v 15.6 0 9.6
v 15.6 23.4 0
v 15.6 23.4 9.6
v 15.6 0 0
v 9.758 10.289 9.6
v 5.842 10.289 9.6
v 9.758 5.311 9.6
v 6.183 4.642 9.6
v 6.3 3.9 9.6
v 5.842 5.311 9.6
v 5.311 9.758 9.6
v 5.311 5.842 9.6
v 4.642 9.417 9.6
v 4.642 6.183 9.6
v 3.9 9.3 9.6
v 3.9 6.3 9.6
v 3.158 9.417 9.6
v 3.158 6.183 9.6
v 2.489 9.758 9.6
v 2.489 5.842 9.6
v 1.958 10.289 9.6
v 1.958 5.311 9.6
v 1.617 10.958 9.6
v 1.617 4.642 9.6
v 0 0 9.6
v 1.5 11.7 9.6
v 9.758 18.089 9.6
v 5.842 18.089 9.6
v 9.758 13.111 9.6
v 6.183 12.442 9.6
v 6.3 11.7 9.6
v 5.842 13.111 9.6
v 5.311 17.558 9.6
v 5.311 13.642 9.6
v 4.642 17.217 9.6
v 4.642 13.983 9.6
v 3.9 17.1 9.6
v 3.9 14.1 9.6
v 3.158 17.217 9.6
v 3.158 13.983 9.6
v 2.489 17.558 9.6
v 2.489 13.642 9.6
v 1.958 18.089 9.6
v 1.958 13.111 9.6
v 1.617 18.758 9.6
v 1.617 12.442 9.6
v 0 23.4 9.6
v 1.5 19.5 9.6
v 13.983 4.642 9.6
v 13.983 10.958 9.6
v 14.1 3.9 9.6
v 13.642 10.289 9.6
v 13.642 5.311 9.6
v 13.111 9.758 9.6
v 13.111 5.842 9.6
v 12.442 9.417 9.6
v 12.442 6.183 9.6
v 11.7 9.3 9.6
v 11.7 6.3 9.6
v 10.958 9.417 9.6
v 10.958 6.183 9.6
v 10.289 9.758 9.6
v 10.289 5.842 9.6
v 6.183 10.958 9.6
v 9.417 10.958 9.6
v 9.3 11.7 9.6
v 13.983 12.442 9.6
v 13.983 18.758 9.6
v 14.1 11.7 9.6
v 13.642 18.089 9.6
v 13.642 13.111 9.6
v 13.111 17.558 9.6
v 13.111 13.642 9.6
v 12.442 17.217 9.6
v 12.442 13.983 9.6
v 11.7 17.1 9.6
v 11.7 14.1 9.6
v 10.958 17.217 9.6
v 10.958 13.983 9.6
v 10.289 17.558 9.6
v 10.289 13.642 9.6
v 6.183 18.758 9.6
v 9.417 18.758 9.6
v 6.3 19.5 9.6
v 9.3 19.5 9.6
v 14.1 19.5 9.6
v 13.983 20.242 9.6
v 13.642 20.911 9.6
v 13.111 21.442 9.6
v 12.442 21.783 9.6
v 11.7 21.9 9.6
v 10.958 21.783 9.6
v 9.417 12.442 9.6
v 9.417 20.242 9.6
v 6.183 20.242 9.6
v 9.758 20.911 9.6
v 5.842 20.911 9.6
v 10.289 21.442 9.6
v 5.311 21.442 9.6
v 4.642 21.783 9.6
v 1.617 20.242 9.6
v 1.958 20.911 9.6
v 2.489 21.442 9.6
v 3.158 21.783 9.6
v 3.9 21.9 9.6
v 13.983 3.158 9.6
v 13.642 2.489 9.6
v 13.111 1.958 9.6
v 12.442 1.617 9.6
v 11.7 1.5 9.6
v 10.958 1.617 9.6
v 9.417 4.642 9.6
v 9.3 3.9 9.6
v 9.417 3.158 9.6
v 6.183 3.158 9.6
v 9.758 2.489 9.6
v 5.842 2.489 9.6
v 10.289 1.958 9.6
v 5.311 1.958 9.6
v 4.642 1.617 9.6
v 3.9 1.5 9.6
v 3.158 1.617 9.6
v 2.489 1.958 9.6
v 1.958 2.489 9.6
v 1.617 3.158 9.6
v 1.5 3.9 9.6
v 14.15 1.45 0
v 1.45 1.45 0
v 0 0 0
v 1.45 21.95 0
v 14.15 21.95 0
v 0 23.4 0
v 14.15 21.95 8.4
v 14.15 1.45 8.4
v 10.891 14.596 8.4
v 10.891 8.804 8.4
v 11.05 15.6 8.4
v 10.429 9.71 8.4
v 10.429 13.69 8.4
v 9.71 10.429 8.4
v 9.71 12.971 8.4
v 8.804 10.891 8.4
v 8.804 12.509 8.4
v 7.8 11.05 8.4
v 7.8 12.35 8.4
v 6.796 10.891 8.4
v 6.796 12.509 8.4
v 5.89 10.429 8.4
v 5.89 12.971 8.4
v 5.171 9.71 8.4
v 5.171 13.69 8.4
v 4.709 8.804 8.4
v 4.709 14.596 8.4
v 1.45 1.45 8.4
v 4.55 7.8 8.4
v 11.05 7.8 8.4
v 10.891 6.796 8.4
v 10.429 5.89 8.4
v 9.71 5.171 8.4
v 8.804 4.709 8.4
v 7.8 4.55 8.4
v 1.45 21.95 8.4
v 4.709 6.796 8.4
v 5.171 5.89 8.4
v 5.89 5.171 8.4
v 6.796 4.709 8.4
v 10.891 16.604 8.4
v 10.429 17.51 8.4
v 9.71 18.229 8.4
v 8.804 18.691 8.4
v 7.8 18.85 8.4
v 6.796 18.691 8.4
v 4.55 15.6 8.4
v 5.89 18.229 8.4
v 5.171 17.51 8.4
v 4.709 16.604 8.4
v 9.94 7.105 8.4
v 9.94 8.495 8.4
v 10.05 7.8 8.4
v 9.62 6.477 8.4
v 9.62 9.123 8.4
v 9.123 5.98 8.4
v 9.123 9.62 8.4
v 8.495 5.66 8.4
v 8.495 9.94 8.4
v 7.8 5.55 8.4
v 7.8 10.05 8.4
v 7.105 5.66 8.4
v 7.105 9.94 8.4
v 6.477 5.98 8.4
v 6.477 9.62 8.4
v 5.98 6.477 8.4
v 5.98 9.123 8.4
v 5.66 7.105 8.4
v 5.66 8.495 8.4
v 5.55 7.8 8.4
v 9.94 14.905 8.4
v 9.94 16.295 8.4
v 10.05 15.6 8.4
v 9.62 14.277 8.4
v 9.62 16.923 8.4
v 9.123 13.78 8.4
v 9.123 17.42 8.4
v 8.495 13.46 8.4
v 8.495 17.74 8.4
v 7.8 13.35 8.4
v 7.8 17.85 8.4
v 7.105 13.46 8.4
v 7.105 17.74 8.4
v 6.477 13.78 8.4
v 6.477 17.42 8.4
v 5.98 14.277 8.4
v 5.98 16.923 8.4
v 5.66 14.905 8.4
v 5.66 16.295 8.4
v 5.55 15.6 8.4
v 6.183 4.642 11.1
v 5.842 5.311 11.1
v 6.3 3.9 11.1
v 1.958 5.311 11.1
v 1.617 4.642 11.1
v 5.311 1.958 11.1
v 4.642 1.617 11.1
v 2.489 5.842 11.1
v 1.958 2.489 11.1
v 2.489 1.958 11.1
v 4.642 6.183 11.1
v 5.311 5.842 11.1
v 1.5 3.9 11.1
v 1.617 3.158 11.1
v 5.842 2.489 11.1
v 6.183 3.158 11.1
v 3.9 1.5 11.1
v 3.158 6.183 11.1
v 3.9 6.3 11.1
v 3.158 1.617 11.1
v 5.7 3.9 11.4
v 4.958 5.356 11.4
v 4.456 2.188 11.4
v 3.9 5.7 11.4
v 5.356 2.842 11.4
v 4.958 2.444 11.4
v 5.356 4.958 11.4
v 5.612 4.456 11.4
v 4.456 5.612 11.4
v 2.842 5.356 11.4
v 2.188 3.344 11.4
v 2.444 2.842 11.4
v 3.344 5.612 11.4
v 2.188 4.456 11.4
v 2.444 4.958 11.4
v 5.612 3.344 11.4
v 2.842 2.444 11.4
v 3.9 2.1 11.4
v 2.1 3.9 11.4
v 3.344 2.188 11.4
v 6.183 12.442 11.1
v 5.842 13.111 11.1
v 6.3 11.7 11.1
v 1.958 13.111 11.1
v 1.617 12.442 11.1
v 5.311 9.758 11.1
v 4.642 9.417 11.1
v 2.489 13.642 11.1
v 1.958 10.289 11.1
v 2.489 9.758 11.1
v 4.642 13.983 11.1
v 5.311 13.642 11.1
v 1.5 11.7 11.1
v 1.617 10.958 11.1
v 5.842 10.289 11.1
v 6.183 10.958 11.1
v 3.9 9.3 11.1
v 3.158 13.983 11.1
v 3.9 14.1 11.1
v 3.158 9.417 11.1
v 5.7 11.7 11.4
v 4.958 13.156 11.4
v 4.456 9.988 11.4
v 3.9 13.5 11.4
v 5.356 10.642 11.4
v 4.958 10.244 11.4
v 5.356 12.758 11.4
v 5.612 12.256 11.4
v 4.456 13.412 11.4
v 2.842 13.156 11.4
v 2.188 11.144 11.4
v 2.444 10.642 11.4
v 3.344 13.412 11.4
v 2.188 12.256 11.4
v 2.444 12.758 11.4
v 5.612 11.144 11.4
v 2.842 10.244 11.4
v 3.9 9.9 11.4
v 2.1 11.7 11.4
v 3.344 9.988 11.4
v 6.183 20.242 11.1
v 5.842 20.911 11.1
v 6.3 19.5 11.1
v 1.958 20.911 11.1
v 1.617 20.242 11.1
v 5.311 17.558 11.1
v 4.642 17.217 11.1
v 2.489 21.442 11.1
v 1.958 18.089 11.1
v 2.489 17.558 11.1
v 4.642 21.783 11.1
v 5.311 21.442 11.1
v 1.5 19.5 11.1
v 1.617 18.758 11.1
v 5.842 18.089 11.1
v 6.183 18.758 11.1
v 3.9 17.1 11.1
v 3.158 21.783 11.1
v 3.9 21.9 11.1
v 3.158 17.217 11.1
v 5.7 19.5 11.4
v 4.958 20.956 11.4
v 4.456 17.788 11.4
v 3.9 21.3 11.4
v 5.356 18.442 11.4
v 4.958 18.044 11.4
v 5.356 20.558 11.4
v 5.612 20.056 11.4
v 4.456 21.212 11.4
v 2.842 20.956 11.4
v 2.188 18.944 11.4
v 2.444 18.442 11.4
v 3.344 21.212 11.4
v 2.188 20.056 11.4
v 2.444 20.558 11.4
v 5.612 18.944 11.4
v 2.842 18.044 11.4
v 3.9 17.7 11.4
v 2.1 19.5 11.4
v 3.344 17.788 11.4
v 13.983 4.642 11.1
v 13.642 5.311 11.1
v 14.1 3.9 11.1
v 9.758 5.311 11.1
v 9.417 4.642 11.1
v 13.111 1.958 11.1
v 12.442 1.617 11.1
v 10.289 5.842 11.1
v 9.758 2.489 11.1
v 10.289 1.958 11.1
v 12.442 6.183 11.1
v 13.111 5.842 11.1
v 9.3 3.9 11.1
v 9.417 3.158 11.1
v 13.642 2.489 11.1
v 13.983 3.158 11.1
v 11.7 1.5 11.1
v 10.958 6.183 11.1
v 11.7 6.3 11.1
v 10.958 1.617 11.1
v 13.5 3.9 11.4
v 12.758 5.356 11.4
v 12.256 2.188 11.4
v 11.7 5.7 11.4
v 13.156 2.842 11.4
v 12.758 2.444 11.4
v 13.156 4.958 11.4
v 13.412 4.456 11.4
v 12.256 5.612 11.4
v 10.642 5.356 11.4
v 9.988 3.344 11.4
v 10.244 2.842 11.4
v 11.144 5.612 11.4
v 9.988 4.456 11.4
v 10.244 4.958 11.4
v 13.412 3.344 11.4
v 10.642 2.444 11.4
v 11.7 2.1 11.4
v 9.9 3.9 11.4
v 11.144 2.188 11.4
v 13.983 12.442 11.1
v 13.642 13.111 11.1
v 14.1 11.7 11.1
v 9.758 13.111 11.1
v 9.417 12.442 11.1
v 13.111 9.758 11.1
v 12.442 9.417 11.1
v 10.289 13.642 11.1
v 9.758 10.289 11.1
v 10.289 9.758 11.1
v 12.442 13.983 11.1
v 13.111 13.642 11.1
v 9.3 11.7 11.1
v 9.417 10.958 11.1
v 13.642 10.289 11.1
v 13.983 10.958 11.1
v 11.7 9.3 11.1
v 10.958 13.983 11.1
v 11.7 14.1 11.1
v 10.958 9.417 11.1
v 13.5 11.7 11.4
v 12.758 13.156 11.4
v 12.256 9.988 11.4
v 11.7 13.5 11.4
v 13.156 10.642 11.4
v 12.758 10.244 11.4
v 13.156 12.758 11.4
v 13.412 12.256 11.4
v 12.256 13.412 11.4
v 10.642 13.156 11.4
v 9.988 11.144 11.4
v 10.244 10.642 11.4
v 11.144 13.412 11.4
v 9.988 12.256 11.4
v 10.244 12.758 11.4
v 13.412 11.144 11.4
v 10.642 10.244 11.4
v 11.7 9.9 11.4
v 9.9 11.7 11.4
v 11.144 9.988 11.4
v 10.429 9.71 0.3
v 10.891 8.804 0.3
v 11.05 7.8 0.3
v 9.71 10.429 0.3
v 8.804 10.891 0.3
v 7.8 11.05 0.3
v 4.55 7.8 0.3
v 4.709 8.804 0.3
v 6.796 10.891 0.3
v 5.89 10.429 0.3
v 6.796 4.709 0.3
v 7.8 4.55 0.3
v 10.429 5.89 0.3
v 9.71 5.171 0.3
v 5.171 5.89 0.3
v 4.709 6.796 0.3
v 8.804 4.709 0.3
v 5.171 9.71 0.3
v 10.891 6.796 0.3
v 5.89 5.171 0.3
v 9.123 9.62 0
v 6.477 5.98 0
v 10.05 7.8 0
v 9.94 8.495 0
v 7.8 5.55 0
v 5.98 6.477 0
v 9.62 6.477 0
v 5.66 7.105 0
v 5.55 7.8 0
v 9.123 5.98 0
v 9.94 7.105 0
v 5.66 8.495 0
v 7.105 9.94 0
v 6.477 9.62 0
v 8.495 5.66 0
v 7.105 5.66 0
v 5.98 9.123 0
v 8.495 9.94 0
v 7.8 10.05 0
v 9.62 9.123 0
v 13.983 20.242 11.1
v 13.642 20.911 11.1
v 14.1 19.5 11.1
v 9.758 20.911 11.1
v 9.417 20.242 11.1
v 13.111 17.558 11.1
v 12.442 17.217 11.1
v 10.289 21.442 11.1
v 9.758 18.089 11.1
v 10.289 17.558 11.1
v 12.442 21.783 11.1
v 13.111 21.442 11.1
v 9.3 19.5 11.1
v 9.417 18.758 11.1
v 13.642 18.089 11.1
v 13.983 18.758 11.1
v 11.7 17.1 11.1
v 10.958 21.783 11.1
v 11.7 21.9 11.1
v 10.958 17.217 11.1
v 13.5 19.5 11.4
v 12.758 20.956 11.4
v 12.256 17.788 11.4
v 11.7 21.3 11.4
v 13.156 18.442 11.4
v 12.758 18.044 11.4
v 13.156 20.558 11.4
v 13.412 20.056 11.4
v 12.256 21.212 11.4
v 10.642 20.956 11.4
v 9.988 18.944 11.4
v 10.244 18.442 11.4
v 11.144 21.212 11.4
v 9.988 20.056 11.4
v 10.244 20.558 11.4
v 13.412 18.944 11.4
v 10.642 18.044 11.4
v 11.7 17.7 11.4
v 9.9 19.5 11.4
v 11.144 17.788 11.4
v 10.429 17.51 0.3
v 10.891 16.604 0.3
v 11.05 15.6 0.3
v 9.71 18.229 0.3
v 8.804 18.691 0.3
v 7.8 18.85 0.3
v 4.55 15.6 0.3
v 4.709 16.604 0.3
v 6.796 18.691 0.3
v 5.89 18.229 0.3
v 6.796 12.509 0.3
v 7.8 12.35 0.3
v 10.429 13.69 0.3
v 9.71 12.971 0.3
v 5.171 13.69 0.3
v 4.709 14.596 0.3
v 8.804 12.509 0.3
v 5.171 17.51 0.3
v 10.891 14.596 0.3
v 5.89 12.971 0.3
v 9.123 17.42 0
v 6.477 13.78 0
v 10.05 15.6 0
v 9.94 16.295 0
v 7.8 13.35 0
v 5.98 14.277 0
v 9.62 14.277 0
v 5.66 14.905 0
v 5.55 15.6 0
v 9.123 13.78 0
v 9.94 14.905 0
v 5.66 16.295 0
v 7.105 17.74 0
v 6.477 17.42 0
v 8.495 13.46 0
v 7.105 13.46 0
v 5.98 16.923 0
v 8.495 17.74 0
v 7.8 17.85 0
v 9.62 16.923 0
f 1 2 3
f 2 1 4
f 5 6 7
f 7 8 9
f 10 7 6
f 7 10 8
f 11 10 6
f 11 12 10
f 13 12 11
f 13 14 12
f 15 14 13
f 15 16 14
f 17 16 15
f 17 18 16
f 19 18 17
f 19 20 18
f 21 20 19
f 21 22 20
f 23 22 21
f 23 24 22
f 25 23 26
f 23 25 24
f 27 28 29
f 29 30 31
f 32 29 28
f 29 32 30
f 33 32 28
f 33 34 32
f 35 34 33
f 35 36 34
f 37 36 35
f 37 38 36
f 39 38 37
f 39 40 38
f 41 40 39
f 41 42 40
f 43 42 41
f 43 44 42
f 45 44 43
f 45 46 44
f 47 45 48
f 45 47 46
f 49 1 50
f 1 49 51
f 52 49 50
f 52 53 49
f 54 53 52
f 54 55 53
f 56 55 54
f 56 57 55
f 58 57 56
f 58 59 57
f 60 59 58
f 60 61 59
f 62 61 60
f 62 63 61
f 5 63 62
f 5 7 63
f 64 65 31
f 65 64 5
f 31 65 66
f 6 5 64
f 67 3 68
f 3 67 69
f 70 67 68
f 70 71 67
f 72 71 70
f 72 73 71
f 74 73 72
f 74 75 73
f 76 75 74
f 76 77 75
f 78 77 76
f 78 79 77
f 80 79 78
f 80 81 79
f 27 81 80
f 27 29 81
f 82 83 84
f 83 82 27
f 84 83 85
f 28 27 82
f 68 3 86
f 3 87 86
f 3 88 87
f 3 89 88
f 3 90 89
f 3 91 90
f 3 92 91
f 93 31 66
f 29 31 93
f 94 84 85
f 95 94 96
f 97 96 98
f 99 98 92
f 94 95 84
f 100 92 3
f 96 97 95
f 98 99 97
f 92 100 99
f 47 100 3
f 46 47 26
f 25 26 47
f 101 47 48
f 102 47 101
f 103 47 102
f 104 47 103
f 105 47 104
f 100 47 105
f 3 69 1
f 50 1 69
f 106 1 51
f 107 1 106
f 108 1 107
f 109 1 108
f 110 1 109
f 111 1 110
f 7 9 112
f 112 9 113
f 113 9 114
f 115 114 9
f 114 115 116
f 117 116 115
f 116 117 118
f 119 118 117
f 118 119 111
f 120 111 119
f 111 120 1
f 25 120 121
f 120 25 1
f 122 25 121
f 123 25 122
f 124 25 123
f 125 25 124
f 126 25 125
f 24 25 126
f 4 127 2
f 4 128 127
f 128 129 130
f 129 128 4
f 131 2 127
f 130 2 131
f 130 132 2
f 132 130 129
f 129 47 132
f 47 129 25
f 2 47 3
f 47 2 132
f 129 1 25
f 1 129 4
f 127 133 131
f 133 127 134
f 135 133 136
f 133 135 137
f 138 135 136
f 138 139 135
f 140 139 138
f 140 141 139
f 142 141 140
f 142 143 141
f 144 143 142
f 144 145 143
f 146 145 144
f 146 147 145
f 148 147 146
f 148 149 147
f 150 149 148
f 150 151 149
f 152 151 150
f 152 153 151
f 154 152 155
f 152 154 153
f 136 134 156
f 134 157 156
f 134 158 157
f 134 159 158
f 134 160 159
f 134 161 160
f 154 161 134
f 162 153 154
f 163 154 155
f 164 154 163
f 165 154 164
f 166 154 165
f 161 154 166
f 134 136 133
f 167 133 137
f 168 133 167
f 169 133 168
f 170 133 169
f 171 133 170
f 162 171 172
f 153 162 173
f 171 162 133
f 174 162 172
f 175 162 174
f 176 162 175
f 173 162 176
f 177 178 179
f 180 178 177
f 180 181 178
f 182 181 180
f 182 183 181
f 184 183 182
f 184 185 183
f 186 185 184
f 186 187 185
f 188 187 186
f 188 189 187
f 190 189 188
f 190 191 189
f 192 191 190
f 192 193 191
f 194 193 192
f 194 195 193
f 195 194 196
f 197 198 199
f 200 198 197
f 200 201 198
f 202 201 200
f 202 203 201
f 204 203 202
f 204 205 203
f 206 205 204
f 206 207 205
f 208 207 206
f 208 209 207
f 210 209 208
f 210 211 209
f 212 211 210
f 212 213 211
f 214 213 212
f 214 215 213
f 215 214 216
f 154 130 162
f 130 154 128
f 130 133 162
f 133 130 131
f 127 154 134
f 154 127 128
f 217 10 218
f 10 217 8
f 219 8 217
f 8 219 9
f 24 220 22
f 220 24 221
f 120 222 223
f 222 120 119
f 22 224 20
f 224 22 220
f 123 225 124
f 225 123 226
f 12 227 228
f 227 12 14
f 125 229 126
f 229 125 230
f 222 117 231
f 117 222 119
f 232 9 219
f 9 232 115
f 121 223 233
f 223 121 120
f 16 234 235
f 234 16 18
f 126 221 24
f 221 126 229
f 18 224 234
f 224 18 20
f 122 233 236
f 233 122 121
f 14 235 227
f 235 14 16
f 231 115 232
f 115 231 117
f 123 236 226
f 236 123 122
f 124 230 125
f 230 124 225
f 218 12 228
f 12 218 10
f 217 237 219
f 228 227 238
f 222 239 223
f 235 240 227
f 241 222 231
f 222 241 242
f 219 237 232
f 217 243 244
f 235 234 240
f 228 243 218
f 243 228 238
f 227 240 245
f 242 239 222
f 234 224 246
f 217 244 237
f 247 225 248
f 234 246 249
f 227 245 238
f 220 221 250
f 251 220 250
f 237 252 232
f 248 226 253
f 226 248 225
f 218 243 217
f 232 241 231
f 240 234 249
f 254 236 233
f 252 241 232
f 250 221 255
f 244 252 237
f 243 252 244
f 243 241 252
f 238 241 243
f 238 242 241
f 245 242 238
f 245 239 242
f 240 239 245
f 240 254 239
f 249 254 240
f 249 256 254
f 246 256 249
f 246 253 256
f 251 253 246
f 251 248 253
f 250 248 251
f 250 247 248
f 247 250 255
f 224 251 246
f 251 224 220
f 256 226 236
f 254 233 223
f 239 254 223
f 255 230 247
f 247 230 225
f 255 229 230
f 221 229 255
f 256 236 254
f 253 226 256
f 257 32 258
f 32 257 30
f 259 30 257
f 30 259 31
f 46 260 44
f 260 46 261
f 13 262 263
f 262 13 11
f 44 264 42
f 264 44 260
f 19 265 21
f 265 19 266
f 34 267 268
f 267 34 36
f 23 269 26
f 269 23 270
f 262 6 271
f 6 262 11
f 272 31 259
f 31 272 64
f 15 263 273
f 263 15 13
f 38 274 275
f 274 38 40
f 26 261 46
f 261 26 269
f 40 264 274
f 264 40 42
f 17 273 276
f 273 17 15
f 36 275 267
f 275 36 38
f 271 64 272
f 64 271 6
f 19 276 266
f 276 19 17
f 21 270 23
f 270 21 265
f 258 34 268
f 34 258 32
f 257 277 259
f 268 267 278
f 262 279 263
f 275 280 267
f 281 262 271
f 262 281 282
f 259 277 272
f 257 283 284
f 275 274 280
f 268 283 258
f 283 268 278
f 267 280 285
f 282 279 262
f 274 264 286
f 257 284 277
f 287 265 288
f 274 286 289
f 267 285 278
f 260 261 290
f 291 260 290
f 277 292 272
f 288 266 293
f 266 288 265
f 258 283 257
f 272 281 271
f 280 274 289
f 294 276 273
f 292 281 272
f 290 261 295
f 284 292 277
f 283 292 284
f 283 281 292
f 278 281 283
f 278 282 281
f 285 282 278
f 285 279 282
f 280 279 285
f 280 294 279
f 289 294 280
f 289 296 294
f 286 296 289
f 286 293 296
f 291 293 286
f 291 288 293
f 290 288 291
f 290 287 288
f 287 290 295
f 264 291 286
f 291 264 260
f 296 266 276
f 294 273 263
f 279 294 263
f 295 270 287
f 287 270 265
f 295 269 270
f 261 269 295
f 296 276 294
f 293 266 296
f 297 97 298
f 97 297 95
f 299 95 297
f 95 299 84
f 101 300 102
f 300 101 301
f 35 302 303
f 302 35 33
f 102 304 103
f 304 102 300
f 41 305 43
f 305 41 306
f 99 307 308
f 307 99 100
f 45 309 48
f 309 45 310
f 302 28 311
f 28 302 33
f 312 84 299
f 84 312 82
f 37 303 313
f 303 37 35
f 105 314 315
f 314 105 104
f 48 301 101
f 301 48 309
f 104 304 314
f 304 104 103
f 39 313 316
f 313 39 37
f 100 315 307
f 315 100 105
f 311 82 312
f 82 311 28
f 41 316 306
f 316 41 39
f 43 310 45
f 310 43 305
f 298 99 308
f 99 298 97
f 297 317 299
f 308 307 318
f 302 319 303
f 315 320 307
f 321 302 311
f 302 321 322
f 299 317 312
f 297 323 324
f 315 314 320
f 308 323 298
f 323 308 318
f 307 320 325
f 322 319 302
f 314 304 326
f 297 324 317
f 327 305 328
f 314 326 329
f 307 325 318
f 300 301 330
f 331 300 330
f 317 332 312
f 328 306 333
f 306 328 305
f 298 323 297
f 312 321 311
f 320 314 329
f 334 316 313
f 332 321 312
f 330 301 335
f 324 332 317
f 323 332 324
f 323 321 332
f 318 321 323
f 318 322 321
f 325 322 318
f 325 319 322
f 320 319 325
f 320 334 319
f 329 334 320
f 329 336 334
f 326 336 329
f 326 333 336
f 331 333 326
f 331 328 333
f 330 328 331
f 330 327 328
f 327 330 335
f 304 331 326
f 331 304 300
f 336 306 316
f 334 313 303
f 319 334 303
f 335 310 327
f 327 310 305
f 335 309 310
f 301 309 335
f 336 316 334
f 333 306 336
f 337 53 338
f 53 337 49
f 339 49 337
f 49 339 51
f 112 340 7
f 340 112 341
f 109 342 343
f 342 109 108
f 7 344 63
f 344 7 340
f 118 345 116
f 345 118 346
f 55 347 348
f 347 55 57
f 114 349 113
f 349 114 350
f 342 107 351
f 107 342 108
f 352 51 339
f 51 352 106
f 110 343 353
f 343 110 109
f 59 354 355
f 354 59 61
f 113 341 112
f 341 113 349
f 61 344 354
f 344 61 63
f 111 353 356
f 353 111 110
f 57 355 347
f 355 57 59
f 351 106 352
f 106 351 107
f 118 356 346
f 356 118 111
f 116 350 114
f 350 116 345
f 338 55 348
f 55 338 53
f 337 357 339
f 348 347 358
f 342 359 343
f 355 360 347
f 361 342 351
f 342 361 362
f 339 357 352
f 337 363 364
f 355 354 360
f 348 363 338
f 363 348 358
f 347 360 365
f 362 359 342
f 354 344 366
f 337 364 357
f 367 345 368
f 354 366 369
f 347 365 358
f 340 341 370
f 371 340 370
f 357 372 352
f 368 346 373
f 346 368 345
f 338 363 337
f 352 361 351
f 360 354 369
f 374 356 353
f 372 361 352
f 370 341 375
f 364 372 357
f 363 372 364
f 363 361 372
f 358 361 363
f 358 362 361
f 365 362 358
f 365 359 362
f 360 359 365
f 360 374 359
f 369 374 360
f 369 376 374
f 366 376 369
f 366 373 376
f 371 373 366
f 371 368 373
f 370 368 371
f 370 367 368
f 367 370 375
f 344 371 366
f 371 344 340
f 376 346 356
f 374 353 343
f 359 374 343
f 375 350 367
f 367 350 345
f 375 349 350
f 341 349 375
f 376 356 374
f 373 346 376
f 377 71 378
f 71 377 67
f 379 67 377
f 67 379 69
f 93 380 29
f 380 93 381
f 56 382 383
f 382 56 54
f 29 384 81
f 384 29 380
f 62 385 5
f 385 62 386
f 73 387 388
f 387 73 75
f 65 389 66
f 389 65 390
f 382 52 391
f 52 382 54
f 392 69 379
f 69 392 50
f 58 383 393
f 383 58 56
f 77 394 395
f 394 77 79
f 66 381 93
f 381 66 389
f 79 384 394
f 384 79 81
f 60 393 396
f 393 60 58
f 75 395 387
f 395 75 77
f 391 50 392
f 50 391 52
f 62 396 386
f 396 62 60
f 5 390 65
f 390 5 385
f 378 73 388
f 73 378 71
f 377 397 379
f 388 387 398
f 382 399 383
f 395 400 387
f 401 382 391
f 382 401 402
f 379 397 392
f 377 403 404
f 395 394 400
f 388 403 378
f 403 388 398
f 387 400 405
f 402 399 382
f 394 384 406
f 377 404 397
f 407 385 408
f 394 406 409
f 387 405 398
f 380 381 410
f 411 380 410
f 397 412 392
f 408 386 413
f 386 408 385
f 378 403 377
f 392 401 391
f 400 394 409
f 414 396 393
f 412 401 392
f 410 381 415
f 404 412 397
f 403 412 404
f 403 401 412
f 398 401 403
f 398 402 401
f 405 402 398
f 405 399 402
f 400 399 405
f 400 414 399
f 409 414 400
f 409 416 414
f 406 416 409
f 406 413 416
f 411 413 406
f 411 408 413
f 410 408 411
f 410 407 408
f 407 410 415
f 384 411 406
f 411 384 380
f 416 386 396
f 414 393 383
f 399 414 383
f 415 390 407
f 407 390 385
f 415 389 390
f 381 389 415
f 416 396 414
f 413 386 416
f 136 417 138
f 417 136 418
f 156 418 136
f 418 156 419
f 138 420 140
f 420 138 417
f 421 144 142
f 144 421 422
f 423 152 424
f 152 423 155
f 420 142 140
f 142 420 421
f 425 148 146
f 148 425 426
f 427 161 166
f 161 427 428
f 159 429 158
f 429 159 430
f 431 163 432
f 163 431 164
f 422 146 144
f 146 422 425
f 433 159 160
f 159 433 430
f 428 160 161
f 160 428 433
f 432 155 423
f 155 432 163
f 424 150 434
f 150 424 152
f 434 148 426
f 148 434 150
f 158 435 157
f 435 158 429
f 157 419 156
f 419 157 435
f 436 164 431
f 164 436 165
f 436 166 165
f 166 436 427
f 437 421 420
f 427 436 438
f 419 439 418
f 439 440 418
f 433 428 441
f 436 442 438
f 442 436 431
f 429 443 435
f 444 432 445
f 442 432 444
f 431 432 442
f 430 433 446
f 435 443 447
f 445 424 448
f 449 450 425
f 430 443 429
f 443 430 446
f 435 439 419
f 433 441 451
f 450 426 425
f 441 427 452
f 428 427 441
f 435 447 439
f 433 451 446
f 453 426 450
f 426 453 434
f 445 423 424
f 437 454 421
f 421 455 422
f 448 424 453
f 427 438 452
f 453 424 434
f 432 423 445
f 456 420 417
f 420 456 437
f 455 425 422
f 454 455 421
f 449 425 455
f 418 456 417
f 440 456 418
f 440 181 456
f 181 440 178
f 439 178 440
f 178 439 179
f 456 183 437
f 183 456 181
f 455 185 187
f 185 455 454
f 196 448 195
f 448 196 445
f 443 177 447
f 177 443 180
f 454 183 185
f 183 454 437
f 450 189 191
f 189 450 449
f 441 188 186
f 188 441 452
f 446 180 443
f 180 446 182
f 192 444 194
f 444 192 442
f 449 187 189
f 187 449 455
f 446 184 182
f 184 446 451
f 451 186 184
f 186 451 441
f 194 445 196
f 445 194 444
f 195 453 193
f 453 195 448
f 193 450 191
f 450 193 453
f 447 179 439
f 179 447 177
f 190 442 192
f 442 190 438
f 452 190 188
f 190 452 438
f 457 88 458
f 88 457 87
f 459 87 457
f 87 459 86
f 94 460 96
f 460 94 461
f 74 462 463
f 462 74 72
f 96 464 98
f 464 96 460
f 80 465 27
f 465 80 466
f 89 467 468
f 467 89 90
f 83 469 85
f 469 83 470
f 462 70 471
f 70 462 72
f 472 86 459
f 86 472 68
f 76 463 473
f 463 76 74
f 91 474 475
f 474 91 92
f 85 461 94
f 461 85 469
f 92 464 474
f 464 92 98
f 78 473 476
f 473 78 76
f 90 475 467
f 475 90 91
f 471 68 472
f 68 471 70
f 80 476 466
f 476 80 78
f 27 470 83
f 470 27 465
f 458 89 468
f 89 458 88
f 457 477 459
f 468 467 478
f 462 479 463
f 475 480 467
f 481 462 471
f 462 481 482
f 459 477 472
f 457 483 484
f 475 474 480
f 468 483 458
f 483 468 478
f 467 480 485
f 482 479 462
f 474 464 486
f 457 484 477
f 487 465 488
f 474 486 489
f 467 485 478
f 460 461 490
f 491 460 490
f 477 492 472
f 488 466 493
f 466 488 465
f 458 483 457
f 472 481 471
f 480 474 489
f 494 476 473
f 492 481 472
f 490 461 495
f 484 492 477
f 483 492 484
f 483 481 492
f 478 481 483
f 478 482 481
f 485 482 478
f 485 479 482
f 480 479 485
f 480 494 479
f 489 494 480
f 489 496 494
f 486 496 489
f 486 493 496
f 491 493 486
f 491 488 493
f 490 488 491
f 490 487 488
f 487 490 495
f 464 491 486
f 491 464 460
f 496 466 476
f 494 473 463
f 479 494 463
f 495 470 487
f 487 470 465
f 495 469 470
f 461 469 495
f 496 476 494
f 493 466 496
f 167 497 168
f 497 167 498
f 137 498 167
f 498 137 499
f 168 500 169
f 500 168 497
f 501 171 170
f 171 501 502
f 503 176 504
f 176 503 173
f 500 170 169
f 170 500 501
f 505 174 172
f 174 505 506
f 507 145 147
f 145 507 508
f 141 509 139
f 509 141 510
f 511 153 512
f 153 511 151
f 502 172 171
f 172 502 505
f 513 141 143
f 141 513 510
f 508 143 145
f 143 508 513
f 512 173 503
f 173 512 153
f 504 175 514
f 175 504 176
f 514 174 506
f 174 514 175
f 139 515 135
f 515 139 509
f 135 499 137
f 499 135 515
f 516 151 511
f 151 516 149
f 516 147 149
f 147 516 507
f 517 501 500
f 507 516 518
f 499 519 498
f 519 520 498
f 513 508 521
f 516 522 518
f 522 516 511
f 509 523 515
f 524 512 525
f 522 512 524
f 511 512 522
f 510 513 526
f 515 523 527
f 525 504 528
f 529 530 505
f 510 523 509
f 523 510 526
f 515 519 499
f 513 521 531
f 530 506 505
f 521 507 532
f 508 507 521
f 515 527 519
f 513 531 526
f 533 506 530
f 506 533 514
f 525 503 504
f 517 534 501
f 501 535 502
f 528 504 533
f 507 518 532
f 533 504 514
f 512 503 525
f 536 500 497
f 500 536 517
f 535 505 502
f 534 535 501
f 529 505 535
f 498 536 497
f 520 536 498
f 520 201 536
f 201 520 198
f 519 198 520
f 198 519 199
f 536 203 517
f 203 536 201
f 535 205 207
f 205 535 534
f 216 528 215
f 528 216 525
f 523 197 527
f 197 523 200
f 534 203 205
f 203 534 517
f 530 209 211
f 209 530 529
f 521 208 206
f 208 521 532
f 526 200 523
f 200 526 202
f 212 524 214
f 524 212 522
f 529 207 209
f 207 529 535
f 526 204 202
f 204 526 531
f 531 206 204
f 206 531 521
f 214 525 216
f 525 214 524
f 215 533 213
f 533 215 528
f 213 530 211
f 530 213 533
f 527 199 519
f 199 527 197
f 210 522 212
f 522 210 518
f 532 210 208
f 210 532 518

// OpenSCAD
//number of lines
quantx=2; //[1:100]
//number of columns
quanty=3; //[1:100]
module lego(){
    difference(){
        cube([7.8*quantx,7.8*quanty,9.6]);
        translate([1.45,1.45,0])
            cube([7.8*quantx-2.9,7.8*quanty-2.9,8.4]);
    }
    for(countx=[1:1:quantx]){
        for(county=[1:1:quanty]){
            translate([countx*7.8,county*7.8,0])
                pino();
            if ( (countx >1) && (county >1) ){
            translate([-7.8+countx*7.8,-7.8+county*7.8,0])
                pinoinf();
               
            } 
        }
    
    }    
    }
module pino(){
    translate([-3.9,-3.9,9.6])
        cylinder(1.5,2.4,2.4,$fn=20);
    translate([-3.9,-3.9,11.1])
        cylinder(.3,2.4,1.8,$fn=20);
}
module pinoinf(){
    difference(){
        union(){
            translate([0,0,.3])
                cylinder(9,3.25,3.25,$fn=20);
            cylinder(.3,2.25,3.25,$fn=20);
        }
        cylinder(9.3,2.25,2.25,$fn=20);
    }
}
lego();
//pino();
